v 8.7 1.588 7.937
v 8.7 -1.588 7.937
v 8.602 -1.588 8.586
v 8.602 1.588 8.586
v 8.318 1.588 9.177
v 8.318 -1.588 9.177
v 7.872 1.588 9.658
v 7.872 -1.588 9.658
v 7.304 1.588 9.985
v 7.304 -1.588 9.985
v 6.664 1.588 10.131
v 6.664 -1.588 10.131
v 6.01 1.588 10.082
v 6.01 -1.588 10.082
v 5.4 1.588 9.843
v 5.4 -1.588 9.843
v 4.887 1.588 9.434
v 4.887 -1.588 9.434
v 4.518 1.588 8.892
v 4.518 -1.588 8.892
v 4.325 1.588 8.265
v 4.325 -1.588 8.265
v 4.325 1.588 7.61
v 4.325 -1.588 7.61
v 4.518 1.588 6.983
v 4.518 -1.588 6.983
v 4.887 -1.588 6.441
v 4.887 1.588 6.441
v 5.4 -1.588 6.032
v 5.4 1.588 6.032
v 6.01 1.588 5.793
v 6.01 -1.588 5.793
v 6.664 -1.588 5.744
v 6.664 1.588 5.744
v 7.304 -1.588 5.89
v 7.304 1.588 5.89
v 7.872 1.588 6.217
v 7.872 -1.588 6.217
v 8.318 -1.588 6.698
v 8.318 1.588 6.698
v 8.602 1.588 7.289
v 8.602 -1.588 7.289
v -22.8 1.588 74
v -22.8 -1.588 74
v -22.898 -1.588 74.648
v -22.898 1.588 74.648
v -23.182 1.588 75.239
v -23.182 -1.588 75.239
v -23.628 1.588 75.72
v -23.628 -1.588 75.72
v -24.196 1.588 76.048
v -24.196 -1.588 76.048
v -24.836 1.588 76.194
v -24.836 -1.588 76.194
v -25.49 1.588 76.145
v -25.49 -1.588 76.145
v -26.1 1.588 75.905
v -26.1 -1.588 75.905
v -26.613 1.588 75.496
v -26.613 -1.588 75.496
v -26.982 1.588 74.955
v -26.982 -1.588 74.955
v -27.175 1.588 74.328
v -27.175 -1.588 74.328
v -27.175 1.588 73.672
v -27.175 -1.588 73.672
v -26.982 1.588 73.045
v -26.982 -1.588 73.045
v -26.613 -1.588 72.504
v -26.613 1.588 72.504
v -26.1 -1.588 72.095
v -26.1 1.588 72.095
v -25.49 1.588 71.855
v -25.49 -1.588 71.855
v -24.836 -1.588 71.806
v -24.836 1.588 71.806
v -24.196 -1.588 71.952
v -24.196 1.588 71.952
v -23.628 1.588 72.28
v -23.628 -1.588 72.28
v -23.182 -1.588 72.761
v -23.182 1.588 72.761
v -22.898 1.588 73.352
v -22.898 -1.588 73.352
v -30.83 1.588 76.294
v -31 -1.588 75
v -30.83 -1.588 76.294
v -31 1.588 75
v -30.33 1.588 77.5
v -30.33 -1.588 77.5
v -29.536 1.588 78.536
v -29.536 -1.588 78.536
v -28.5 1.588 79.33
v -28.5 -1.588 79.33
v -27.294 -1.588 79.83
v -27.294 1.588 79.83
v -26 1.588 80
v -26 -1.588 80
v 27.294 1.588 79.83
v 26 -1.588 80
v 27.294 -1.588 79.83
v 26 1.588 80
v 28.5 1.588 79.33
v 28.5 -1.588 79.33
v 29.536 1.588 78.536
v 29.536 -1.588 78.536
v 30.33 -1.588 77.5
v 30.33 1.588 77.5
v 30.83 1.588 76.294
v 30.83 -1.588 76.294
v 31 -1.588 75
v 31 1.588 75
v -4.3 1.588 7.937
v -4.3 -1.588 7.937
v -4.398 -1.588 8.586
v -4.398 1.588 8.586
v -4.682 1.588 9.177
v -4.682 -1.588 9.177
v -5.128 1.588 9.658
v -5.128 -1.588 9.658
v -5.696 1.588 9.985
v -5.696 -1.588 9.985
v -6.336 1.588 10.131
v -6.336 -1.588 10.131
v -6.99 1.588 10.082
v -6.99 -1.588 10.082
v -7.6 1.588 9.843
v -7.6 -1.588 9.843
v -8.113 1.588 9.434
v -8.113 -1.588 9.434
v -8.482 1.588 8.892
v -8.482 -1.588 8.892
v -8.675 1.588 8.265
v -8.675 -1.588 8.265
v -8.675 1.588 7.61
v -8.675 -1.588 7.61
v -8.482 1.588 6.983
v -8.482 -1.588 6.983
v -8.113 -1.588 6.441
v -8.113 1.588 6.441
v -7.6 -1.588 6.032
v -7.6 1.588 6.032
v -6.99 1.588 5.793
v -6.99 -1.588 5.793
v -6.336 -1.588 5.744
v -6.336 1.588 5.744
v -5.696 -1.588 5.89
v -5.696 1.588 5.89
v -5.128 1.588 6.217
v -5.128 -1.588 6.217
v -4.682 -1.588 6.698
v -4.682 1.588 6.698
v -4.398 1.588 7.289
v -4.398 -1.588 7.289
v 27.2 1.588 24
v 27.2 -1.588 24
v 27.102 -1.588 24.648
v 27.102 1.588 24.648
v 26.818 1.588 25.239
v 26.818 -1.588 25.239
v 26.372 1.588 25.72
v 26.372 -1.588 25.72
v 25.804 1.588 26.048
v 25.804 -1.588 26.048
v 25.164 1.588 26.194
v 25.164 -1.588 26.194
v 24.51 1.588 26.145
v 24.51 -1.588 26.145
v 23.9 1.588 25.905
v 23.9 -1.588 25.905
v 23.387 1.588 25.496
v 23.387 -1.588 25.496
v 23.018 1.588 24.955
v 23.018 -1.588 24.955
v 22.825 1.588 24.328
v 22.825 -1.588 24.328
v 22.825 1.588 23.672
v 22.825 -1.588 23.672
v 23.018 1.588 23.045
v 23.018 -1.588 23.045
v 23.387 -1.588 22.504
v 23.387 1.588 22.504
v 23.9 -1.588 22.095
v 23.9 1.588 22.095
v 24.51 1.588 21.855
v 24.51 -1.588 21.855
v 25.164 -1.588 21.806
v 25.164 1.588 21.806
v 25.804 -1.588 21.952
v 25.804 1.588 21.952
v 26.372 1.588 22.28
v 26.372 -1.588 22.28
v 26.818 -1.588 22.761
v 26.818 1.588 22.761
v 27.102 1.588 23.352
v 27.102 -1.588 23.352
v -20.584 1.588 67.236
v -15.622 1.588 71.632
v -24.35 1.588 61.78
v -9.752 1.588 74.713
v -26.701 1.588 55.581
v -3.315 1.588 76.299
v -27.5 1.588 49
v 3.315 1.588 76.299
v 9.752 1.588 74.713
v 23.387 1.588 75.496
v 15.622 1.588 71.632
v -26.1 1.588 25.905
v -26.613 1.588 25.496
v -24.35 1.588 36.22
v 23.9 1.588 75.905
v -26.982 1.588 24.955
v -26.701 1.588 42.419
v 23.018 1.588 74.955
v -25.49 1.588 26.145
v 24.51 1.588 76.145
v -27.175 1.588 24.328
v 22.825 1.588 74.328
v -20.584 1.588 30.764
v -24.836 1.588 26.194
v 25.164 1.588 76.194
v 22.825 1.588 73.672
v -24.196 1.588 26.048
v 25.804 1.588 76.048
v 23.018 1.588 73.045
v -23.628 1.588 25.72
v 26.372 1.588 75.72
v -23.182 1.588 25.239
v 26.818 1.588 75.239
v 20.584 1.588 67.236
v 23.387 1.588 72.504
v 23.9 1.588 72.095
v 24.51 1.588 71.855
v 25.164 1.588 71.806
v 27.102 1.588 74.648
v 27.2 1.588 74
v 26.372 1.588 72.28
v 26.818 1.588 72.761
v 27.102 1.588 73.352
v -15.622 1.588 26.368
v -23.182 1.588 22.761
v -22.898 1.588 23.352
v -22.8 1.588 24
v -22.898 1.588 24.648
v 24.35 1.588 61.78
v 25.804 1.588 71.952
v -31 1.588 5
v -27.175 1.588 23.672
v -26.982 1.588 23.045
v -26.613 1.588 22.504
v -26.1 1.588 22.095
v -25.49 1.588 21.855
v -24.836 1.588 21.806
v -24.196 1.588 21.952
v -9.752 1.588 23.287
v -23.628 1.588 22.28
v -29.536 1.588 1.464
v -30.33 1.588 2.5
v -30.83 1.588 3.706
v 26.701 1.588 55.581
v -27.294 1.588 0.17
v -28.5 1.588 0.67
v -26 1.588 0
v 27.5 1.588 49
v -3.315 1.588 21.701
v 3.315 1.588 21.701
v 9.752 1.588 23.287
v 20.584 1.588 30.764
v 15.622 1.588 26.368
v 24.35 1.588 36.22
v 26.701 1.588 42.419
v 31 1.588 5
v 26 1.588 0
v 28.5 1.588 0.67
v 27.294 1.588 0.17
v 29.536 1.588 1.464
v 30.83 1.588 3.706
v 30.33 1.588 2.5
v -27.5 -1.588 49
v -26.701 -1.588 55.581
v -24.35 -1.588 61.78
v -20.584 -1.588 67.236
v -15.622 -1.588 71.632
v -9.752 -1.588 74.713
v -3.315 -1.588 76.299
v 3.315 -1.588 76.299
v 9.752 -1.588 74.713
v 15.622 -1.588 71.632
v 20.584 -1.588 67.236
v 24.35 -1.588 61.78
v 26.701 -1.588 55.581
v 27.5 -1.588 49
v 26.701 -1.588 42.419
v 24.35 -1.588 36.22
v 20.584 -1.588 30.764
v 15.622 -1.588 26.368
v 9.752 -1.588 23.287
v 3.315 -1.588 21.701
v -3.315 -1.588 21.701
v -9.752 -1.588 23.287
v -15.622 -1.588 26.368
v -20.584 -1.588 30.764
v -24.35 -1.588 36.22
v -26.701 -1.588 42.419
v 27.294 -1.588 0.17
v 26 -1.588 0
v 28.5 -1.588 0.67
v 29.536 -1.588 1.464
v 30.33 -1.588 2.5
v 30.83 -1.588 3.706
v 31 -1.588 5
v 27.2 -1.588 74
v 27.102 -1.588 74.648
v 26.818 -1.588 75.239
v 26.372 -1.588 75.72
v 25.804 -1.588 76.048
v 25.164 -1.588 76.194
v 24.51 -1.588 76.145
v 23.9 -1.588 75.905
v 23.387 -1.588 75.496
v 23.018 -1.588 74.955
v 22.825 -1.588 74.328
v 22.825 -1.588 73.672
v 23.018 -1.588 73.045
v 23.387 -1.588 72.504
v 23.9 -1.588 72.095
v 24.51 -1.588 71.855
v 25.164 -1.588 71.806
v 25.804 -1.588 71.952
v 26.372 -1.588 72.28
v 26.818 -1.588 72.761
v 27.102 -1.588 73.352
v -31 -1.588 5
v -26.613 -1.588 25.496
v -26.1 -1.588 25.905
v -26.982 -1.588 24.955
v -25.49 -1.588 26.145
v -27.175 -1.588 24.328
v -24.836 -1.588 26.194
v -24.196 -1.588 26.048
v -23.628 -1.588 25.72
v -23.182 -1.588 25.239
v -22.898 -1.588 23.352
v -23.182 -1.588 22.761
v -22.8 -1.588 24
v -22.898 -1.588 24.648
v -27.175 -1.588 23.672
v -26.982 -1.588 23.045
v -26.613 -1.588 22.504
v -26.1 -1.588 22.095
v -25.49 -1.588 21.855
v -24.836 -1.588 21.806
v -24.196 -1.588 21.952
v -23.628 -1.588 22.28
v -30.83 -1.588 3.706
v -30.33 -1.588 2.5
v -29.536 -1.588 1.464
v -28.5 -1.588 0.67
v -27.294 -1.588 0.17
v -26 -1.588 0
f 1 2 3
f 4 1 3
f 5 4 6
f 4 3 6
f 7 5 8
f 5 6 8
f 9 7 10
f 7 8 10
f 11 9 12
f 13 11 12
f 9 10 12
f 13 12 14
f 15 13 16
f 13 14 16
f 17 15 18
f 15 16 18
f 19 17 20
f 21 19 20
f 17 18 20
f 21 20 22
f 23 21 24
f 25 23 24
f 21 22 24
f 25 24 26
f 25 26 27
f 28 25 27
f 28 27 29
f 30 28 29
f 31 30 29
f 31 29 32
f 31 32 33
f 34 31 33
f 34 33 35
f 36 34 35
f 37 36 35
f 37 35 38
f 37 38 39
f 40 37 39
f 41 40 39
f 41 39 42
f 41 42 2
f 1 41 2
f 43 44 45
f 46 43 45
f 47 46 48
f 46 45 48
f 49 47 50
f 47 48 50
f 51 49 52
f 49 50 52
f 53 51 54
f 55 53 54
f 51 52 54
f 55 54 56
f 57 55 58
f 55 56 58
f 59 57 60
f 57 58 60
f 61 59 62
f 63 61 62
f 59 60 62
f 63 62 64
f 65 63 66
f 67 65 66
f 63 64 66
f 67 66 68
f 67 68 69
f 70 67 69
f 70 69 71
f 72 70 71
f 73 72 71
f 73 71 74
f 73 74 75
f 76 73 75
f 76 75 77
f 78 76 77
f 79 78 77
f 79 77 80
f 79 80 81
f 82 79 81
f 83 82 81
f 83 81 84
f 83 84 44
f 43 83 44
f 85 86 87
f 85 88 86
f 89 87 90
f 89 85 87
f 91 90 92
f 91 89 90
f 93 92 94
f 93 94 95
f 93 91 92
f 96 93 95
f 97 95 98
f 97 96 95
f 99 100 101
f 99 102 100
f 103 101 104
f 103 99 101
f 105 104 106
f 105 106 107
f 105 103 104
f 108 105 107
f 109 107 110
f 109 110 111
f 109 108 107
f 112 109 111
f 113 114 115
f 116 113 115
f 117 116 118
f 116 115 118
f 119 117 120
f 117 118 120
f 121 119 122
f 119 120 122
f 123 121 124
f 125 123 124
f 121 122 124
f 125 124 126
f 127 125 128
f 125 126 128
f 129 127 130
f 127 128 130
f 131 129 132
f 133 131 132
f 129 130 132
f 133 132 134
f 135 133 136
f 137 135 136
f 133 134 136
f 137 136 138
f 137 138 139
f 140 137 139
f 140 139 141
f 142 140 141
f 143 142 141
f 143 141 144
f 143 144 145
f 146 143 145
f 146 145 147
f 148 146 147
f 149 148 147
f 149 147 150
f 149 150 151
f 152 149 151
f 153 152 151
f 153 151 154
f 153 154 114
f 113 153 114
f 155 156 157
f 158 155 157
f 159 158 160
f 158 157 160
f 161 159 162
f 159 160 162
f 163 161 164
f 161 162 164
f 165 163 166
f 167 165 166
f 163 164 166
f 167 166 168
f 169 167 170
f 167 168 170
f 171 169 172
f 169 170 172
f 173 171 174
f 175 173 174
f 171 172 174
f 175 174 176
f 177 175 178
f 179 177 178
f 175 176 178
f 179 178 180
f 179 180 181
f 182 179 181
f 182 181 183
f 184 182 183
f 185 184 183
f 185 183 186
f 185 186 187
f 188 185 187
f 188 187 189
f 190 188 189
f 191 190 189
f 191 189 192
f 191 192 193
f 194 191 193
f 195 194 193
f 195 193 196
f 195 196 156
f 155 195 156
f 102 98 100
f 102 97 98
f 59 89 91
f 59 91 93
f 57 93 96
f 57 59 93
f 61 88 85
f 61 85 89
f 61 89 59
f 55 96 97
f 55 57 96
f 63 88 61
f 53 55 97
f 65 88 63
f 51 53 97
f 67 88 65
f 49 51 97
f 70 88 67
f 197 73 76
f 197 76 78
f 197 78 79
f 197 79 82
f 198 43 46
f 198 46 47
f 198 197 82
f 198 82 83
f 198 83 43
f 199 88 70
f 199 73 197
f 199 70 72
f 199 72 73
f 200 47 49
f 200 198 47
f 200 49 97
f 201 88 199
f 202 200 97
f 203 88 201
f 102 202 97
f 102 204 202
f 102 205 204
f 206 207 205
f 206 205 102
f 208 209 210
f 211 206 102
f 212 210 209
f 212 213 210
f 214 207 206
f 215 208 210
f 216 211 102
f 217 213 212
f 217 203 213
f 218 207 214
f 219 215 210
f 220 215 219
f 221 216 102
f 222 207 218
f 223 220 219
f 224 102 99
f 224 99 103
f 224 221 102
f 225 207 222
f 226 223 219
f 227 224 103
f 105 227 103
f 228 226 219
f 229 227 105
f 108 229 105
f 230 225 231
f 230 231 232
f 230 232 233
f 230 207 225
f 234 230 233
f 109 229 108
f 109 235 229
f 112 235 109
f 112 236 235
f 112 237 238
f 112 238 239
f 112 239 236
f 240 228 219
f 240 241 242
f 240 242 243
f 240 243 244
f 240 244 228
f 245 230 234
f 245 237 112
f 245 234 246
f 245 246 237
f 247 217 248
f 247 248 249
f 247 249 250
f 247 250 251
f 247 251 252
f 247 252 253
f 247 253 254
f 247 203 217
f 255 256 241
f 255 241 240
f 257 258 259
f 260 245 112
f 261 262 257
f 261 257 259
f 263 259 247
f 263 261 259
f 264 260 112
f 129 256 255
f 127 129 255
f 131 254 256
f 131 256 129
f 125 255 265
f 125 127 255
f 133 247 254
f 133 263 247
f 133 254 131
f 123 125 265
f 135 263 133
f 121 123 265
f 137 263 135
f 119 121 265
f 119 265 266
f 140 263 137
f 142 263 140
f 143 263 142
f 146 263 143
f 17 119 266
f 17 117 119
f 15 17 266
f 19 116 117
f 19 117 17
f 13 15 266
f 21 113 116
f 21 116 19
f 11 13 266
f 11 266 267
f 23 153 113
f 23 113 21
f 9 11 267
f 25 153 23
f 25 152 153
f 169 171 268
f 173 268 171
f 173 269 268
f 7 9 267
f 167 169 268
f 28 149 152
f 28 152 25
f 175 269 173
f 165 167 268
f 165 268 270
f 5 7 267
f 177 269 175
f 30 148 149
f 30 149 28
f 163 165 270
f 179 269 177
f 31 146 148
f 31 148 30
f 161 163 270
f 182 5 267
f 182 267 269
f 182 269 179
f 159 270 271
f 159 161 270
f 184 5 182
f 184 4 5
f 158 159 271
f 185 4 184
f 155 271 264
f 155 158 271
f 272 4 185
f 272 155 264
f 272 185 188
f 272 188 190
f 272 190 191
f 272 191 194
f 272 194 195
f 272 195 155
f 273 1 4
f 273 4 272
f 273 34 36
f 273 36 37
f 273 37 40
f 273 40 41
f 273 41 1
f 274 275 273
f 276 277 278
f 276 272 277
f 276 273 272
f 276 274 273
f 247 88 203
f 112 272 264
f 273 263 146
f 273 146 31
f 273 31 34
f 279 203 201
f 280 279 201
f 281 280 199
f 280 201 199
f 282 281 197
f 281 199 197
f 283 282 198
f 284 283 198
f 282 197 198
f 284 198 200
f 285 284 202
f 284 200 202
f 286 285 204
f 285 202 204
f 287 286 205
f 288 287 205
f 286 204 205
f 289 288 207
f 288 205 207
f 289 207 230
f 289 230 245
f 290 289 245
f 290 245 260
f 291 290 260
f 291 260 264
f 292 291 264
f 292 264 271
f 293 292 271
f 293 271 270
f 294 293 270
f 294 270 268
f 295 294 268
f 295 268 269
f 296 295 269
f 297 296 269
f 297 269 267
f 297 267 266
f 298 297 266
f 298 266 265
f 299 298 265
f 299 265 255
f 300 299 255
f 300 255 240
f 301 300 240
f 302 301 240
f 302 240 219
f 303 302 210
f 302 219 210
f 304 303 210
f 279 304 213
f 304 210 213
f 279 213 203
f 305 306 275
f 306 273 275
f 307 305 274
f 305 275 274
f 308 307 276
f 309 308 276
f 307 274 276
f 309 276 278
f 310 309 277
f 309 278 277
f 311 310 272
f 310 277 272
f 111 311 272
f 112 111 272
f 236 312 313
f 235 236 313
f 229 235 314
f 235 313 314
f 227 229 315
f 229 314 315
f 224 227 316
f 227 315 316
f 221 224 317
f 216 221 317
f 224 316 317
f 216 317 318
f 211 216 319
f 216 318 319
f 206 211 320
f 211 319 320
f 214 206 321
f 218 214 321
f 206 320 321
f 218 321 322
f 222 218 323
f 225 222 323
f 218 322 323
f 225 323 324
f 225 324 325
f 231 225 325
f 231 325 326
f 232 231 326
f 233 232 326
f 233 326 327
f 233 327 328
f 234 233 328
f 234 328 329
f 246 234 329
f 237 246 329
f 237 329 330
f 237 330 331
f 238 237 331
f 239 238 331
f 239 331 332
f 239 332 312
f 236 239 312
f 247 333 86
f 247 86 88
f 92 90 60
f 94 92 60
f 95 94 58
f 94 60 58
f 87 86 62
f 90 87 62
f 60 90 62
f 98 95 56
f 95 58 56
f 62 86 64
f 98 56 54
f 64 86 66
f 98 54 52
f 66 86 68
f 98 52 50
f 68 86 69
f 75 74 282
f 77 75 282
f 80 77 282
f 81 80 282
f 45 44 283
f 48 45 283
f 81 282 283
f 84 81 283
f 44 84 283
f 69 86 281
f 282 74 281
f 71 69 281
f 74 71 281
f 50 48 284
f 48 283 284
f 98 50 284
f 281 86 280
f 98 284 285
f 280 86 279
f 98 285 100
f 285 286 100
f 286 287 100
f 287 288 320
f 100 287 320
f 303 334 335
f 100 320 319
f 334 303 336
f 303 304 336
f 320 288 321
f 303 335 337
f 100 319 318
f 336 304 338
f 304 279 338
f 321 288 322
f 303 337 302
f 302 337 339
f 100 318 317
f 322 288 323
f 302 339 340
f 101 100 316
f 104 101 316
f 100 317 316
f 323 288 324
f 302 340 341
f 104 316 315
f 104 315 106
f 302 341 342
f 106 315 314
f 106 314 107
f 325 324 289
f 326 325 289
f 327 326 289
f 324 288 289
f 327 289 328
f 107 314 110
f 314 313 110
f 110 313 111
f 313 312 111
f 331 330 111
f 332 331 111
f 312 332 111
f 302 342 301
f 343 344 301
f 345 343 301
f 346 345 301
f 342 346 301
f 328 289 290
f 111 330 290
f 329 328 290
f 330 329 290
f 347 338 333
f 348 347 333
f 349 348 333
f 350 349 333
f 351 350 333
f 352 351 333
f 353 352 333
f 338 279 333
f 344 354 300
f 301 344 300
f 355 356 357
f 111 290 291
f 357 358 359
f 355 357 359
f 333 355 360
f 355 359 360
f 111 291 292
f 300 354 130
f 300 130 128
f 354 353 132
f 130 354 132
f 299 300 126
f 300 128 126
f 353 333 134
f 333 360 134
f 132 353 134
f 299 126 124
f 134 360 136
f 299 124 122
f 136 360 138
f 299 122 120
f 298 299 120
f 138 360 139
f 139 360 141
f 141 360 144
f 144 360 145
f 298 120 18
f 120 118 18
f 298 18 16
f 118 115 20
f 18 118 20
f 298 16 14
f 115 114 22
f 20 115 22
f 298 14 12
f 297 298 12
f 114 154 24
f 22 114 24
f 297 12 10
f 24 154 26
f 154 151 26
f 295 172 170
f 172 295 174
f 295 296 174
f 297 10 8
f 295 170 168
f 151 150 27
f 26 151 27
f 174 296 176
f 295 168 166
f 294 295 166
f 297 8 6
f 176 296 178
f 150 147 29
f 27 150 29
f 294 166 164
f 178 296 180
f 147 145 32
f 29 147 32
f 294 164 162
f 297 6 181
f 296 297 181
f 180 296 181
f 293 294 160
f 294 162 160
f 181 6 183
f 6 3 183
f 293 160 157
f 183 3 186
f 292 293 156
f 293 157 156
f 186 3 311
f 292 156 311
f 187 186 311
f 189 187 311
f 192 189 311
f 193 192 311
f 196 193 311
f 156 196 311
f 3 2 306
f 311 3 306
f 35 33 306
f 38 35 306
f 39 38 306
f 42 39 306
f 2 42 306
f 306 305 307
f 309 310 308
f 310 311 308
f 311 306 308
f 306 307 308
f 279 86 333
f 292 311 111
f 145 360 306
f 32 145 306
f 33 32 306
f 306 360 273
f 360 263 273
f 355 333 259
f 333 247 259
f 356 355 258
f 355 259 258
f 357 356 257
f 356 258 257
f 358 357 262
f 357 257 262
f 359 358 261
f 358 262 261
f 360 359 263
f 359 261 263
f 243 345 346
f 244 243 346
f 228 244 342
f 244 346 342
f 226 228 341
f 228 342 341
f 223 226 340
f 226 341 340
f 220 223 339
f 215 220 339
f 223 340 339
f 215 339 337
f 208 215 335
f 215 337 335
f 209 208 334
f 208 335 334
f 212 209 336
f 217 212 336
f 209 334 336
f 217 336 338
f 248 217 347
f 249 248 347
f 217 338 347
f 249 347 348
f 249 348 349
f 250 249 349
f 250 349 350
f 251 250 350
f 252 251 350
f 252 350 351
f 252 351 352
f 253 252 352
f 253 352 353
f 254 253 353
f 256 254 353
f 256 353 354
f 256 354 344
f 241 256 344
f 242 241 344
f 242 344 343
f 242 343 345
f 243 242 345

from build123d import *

# Parameters (mm, degrees)
F0_W     = 62
F0_H     = 3.175
F1_DEPTH = 80
F3_D     = 4.4
F5_D     = 4.4
F4_R     = 27.5
F6_DEPTH = 25
F7_R     = 5


with BuildPart() as f1:
    # F0 (on Top) → F1 (new body)
    with BuildSketch(Plane.XY):
        Rectangle(F0_W, F0_H)
    extrude(amount=F1_DEPTH)

    # F3 (through all)
    with Locations(Plane(origin=(0, 1.5875, 0), x_dir=(-1, 0, 0), z_dir=(0, 1, 0))):
        with Locations((-6.5, 7.9375), (6.5, 7.9375)):
            Hole(F3_D / 2)

    # F5 (through all)
    with Locations(Plane(origin=(0, 1.5875, 0), x_dir=(-1, 0, 0), z_dir=(0, 1, 0))):
        with Locations((-25, 74), (25, 74), (25, 24), (-25, 24)):
            Hole(F5_D / 2)

    # F4 (on face) → F6 (cut)
    with BuildSketch(Plane(origin=(0, 1.5875, 0), x_dir=(-1, 0, 0), z_dir=(0, 1, 0))):
        with Locations((0, 49)):
            Circle(F4_R)
    extrude(amount=-F6_DEPTH, mode=Mode.SUBTRACT)

    # F7
    f7_edges = [f1.edges().sort_by_distance(p)[0] for p in [
        (31, 0, 80),
        (-31, 0, 80),
        (-31, 0, 0),
        (31, 0, 0),
    ]]
    fillet(f7_edges, radius=F7_R)


solid = f1.part
